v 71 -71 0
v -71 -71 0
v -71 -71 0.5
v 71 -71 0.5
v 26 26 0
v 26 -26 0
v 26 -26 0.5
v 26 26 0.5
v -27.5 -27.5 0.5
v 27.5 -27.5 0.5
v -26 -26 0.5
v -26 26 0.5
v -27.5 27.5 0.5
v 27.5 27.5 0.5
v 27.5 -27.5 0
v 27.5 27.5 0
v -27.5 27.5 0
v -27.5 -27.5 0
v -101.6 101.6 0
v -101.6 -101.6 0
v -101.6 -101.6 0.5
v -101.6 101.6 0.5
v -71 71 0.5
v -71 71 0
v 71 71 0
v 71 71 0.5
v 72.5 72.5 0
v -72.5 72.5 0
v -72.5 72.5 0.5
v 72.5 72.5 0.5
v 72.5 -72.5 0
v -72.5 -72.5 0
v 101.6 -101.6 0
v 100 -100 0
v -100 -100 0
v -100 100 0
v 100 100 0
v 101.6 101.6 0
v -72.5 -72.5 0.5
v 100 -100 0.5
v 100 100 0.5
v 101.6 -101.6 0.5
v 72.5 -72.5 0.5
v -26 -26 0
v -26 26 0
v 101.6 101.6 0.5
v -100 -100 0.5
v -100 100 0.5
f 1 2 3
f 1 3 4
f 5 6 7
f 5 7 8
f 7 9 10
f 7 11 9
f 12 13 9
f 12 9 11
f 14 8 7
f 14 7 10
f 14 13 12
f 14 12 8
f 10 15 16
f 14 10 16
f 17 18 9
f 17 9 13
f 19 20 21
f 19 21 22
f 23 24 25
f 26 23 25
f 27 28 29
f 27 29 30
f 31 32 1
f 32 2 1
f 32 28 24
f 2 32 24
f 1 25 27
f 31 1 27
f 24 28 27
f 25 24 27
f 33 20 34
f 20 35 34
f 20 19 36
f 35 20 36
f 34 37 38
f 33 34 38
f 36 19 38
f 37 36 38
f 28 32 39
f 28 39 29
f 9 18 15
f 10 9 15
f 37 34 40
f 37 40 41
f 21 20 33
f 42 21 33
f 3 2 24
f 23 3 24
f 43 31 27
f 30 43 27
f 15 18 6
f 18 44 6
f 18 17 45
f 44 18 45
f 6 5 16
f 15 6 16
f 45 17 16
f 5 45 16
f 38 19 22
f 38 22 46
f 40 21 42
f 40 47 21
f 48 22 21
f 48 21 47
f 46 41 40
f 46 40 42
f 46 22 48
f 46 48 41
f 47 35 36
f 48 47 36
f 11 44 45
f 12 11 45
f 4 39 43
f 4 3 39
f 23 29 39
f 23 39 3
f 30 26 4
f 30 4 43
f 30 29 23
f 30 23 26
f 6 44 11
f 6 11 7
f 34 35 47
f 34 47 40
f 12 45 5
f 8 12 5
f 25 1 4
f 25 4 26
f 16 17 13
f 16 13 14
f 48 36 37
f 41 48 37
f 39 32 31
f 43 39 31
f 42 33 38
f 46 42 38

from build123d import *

# Parameters (mm, degrees)
F0_W     = 203.2
F0_H     = 203.2
F0_W_2   = 200
F0_H_2   = 200
F1_DEPTH = 0.5
F0_W_3   = 55
F0_H_3   = 55
F0_W_4   = 52
F0_H_4   = 52
F0_W_5   = 145
F0_H_5   = 145
F0_W_6   = 142
F0_H_6   = 142


with BuildPart() as f1:
    # F0 (on Top) → F1 (new body)
    with BuildSketch(Plane.XY):
        Rectangle(F0_W, F0_H)
        Rectangle(F0_W_2, F0_H_2, mode=Mode.SUBTRACT)
    extrude(amount=F1_DEPTH)


with BuildPart() as f1b:
    # F0 (on Top) → F1, piece 2 (new body)
    with BuildSketch(Plane.XY):
        Rectangle(F0_W_3, F0_H_3)
        Rectangle(F0_W_4, F0_H_4, mode=Mode.SUBTRACT)
    extrude(amount=F1_DEPTH)


with BuildPart() as f1c:
    # F0 (on Top) → F1, piece 3 (new body)
    with BuildSketch(Plane.XY):
        Rectangle(F0_W_5, F0_H_5)
        Rectangle(F0_W_6, F0_H_6, mode=Mode.SUBTRACT)
    extrude(amount=F1_DEPTH)


solid = Compound([f1.part, f1b.part, f1c.part])
